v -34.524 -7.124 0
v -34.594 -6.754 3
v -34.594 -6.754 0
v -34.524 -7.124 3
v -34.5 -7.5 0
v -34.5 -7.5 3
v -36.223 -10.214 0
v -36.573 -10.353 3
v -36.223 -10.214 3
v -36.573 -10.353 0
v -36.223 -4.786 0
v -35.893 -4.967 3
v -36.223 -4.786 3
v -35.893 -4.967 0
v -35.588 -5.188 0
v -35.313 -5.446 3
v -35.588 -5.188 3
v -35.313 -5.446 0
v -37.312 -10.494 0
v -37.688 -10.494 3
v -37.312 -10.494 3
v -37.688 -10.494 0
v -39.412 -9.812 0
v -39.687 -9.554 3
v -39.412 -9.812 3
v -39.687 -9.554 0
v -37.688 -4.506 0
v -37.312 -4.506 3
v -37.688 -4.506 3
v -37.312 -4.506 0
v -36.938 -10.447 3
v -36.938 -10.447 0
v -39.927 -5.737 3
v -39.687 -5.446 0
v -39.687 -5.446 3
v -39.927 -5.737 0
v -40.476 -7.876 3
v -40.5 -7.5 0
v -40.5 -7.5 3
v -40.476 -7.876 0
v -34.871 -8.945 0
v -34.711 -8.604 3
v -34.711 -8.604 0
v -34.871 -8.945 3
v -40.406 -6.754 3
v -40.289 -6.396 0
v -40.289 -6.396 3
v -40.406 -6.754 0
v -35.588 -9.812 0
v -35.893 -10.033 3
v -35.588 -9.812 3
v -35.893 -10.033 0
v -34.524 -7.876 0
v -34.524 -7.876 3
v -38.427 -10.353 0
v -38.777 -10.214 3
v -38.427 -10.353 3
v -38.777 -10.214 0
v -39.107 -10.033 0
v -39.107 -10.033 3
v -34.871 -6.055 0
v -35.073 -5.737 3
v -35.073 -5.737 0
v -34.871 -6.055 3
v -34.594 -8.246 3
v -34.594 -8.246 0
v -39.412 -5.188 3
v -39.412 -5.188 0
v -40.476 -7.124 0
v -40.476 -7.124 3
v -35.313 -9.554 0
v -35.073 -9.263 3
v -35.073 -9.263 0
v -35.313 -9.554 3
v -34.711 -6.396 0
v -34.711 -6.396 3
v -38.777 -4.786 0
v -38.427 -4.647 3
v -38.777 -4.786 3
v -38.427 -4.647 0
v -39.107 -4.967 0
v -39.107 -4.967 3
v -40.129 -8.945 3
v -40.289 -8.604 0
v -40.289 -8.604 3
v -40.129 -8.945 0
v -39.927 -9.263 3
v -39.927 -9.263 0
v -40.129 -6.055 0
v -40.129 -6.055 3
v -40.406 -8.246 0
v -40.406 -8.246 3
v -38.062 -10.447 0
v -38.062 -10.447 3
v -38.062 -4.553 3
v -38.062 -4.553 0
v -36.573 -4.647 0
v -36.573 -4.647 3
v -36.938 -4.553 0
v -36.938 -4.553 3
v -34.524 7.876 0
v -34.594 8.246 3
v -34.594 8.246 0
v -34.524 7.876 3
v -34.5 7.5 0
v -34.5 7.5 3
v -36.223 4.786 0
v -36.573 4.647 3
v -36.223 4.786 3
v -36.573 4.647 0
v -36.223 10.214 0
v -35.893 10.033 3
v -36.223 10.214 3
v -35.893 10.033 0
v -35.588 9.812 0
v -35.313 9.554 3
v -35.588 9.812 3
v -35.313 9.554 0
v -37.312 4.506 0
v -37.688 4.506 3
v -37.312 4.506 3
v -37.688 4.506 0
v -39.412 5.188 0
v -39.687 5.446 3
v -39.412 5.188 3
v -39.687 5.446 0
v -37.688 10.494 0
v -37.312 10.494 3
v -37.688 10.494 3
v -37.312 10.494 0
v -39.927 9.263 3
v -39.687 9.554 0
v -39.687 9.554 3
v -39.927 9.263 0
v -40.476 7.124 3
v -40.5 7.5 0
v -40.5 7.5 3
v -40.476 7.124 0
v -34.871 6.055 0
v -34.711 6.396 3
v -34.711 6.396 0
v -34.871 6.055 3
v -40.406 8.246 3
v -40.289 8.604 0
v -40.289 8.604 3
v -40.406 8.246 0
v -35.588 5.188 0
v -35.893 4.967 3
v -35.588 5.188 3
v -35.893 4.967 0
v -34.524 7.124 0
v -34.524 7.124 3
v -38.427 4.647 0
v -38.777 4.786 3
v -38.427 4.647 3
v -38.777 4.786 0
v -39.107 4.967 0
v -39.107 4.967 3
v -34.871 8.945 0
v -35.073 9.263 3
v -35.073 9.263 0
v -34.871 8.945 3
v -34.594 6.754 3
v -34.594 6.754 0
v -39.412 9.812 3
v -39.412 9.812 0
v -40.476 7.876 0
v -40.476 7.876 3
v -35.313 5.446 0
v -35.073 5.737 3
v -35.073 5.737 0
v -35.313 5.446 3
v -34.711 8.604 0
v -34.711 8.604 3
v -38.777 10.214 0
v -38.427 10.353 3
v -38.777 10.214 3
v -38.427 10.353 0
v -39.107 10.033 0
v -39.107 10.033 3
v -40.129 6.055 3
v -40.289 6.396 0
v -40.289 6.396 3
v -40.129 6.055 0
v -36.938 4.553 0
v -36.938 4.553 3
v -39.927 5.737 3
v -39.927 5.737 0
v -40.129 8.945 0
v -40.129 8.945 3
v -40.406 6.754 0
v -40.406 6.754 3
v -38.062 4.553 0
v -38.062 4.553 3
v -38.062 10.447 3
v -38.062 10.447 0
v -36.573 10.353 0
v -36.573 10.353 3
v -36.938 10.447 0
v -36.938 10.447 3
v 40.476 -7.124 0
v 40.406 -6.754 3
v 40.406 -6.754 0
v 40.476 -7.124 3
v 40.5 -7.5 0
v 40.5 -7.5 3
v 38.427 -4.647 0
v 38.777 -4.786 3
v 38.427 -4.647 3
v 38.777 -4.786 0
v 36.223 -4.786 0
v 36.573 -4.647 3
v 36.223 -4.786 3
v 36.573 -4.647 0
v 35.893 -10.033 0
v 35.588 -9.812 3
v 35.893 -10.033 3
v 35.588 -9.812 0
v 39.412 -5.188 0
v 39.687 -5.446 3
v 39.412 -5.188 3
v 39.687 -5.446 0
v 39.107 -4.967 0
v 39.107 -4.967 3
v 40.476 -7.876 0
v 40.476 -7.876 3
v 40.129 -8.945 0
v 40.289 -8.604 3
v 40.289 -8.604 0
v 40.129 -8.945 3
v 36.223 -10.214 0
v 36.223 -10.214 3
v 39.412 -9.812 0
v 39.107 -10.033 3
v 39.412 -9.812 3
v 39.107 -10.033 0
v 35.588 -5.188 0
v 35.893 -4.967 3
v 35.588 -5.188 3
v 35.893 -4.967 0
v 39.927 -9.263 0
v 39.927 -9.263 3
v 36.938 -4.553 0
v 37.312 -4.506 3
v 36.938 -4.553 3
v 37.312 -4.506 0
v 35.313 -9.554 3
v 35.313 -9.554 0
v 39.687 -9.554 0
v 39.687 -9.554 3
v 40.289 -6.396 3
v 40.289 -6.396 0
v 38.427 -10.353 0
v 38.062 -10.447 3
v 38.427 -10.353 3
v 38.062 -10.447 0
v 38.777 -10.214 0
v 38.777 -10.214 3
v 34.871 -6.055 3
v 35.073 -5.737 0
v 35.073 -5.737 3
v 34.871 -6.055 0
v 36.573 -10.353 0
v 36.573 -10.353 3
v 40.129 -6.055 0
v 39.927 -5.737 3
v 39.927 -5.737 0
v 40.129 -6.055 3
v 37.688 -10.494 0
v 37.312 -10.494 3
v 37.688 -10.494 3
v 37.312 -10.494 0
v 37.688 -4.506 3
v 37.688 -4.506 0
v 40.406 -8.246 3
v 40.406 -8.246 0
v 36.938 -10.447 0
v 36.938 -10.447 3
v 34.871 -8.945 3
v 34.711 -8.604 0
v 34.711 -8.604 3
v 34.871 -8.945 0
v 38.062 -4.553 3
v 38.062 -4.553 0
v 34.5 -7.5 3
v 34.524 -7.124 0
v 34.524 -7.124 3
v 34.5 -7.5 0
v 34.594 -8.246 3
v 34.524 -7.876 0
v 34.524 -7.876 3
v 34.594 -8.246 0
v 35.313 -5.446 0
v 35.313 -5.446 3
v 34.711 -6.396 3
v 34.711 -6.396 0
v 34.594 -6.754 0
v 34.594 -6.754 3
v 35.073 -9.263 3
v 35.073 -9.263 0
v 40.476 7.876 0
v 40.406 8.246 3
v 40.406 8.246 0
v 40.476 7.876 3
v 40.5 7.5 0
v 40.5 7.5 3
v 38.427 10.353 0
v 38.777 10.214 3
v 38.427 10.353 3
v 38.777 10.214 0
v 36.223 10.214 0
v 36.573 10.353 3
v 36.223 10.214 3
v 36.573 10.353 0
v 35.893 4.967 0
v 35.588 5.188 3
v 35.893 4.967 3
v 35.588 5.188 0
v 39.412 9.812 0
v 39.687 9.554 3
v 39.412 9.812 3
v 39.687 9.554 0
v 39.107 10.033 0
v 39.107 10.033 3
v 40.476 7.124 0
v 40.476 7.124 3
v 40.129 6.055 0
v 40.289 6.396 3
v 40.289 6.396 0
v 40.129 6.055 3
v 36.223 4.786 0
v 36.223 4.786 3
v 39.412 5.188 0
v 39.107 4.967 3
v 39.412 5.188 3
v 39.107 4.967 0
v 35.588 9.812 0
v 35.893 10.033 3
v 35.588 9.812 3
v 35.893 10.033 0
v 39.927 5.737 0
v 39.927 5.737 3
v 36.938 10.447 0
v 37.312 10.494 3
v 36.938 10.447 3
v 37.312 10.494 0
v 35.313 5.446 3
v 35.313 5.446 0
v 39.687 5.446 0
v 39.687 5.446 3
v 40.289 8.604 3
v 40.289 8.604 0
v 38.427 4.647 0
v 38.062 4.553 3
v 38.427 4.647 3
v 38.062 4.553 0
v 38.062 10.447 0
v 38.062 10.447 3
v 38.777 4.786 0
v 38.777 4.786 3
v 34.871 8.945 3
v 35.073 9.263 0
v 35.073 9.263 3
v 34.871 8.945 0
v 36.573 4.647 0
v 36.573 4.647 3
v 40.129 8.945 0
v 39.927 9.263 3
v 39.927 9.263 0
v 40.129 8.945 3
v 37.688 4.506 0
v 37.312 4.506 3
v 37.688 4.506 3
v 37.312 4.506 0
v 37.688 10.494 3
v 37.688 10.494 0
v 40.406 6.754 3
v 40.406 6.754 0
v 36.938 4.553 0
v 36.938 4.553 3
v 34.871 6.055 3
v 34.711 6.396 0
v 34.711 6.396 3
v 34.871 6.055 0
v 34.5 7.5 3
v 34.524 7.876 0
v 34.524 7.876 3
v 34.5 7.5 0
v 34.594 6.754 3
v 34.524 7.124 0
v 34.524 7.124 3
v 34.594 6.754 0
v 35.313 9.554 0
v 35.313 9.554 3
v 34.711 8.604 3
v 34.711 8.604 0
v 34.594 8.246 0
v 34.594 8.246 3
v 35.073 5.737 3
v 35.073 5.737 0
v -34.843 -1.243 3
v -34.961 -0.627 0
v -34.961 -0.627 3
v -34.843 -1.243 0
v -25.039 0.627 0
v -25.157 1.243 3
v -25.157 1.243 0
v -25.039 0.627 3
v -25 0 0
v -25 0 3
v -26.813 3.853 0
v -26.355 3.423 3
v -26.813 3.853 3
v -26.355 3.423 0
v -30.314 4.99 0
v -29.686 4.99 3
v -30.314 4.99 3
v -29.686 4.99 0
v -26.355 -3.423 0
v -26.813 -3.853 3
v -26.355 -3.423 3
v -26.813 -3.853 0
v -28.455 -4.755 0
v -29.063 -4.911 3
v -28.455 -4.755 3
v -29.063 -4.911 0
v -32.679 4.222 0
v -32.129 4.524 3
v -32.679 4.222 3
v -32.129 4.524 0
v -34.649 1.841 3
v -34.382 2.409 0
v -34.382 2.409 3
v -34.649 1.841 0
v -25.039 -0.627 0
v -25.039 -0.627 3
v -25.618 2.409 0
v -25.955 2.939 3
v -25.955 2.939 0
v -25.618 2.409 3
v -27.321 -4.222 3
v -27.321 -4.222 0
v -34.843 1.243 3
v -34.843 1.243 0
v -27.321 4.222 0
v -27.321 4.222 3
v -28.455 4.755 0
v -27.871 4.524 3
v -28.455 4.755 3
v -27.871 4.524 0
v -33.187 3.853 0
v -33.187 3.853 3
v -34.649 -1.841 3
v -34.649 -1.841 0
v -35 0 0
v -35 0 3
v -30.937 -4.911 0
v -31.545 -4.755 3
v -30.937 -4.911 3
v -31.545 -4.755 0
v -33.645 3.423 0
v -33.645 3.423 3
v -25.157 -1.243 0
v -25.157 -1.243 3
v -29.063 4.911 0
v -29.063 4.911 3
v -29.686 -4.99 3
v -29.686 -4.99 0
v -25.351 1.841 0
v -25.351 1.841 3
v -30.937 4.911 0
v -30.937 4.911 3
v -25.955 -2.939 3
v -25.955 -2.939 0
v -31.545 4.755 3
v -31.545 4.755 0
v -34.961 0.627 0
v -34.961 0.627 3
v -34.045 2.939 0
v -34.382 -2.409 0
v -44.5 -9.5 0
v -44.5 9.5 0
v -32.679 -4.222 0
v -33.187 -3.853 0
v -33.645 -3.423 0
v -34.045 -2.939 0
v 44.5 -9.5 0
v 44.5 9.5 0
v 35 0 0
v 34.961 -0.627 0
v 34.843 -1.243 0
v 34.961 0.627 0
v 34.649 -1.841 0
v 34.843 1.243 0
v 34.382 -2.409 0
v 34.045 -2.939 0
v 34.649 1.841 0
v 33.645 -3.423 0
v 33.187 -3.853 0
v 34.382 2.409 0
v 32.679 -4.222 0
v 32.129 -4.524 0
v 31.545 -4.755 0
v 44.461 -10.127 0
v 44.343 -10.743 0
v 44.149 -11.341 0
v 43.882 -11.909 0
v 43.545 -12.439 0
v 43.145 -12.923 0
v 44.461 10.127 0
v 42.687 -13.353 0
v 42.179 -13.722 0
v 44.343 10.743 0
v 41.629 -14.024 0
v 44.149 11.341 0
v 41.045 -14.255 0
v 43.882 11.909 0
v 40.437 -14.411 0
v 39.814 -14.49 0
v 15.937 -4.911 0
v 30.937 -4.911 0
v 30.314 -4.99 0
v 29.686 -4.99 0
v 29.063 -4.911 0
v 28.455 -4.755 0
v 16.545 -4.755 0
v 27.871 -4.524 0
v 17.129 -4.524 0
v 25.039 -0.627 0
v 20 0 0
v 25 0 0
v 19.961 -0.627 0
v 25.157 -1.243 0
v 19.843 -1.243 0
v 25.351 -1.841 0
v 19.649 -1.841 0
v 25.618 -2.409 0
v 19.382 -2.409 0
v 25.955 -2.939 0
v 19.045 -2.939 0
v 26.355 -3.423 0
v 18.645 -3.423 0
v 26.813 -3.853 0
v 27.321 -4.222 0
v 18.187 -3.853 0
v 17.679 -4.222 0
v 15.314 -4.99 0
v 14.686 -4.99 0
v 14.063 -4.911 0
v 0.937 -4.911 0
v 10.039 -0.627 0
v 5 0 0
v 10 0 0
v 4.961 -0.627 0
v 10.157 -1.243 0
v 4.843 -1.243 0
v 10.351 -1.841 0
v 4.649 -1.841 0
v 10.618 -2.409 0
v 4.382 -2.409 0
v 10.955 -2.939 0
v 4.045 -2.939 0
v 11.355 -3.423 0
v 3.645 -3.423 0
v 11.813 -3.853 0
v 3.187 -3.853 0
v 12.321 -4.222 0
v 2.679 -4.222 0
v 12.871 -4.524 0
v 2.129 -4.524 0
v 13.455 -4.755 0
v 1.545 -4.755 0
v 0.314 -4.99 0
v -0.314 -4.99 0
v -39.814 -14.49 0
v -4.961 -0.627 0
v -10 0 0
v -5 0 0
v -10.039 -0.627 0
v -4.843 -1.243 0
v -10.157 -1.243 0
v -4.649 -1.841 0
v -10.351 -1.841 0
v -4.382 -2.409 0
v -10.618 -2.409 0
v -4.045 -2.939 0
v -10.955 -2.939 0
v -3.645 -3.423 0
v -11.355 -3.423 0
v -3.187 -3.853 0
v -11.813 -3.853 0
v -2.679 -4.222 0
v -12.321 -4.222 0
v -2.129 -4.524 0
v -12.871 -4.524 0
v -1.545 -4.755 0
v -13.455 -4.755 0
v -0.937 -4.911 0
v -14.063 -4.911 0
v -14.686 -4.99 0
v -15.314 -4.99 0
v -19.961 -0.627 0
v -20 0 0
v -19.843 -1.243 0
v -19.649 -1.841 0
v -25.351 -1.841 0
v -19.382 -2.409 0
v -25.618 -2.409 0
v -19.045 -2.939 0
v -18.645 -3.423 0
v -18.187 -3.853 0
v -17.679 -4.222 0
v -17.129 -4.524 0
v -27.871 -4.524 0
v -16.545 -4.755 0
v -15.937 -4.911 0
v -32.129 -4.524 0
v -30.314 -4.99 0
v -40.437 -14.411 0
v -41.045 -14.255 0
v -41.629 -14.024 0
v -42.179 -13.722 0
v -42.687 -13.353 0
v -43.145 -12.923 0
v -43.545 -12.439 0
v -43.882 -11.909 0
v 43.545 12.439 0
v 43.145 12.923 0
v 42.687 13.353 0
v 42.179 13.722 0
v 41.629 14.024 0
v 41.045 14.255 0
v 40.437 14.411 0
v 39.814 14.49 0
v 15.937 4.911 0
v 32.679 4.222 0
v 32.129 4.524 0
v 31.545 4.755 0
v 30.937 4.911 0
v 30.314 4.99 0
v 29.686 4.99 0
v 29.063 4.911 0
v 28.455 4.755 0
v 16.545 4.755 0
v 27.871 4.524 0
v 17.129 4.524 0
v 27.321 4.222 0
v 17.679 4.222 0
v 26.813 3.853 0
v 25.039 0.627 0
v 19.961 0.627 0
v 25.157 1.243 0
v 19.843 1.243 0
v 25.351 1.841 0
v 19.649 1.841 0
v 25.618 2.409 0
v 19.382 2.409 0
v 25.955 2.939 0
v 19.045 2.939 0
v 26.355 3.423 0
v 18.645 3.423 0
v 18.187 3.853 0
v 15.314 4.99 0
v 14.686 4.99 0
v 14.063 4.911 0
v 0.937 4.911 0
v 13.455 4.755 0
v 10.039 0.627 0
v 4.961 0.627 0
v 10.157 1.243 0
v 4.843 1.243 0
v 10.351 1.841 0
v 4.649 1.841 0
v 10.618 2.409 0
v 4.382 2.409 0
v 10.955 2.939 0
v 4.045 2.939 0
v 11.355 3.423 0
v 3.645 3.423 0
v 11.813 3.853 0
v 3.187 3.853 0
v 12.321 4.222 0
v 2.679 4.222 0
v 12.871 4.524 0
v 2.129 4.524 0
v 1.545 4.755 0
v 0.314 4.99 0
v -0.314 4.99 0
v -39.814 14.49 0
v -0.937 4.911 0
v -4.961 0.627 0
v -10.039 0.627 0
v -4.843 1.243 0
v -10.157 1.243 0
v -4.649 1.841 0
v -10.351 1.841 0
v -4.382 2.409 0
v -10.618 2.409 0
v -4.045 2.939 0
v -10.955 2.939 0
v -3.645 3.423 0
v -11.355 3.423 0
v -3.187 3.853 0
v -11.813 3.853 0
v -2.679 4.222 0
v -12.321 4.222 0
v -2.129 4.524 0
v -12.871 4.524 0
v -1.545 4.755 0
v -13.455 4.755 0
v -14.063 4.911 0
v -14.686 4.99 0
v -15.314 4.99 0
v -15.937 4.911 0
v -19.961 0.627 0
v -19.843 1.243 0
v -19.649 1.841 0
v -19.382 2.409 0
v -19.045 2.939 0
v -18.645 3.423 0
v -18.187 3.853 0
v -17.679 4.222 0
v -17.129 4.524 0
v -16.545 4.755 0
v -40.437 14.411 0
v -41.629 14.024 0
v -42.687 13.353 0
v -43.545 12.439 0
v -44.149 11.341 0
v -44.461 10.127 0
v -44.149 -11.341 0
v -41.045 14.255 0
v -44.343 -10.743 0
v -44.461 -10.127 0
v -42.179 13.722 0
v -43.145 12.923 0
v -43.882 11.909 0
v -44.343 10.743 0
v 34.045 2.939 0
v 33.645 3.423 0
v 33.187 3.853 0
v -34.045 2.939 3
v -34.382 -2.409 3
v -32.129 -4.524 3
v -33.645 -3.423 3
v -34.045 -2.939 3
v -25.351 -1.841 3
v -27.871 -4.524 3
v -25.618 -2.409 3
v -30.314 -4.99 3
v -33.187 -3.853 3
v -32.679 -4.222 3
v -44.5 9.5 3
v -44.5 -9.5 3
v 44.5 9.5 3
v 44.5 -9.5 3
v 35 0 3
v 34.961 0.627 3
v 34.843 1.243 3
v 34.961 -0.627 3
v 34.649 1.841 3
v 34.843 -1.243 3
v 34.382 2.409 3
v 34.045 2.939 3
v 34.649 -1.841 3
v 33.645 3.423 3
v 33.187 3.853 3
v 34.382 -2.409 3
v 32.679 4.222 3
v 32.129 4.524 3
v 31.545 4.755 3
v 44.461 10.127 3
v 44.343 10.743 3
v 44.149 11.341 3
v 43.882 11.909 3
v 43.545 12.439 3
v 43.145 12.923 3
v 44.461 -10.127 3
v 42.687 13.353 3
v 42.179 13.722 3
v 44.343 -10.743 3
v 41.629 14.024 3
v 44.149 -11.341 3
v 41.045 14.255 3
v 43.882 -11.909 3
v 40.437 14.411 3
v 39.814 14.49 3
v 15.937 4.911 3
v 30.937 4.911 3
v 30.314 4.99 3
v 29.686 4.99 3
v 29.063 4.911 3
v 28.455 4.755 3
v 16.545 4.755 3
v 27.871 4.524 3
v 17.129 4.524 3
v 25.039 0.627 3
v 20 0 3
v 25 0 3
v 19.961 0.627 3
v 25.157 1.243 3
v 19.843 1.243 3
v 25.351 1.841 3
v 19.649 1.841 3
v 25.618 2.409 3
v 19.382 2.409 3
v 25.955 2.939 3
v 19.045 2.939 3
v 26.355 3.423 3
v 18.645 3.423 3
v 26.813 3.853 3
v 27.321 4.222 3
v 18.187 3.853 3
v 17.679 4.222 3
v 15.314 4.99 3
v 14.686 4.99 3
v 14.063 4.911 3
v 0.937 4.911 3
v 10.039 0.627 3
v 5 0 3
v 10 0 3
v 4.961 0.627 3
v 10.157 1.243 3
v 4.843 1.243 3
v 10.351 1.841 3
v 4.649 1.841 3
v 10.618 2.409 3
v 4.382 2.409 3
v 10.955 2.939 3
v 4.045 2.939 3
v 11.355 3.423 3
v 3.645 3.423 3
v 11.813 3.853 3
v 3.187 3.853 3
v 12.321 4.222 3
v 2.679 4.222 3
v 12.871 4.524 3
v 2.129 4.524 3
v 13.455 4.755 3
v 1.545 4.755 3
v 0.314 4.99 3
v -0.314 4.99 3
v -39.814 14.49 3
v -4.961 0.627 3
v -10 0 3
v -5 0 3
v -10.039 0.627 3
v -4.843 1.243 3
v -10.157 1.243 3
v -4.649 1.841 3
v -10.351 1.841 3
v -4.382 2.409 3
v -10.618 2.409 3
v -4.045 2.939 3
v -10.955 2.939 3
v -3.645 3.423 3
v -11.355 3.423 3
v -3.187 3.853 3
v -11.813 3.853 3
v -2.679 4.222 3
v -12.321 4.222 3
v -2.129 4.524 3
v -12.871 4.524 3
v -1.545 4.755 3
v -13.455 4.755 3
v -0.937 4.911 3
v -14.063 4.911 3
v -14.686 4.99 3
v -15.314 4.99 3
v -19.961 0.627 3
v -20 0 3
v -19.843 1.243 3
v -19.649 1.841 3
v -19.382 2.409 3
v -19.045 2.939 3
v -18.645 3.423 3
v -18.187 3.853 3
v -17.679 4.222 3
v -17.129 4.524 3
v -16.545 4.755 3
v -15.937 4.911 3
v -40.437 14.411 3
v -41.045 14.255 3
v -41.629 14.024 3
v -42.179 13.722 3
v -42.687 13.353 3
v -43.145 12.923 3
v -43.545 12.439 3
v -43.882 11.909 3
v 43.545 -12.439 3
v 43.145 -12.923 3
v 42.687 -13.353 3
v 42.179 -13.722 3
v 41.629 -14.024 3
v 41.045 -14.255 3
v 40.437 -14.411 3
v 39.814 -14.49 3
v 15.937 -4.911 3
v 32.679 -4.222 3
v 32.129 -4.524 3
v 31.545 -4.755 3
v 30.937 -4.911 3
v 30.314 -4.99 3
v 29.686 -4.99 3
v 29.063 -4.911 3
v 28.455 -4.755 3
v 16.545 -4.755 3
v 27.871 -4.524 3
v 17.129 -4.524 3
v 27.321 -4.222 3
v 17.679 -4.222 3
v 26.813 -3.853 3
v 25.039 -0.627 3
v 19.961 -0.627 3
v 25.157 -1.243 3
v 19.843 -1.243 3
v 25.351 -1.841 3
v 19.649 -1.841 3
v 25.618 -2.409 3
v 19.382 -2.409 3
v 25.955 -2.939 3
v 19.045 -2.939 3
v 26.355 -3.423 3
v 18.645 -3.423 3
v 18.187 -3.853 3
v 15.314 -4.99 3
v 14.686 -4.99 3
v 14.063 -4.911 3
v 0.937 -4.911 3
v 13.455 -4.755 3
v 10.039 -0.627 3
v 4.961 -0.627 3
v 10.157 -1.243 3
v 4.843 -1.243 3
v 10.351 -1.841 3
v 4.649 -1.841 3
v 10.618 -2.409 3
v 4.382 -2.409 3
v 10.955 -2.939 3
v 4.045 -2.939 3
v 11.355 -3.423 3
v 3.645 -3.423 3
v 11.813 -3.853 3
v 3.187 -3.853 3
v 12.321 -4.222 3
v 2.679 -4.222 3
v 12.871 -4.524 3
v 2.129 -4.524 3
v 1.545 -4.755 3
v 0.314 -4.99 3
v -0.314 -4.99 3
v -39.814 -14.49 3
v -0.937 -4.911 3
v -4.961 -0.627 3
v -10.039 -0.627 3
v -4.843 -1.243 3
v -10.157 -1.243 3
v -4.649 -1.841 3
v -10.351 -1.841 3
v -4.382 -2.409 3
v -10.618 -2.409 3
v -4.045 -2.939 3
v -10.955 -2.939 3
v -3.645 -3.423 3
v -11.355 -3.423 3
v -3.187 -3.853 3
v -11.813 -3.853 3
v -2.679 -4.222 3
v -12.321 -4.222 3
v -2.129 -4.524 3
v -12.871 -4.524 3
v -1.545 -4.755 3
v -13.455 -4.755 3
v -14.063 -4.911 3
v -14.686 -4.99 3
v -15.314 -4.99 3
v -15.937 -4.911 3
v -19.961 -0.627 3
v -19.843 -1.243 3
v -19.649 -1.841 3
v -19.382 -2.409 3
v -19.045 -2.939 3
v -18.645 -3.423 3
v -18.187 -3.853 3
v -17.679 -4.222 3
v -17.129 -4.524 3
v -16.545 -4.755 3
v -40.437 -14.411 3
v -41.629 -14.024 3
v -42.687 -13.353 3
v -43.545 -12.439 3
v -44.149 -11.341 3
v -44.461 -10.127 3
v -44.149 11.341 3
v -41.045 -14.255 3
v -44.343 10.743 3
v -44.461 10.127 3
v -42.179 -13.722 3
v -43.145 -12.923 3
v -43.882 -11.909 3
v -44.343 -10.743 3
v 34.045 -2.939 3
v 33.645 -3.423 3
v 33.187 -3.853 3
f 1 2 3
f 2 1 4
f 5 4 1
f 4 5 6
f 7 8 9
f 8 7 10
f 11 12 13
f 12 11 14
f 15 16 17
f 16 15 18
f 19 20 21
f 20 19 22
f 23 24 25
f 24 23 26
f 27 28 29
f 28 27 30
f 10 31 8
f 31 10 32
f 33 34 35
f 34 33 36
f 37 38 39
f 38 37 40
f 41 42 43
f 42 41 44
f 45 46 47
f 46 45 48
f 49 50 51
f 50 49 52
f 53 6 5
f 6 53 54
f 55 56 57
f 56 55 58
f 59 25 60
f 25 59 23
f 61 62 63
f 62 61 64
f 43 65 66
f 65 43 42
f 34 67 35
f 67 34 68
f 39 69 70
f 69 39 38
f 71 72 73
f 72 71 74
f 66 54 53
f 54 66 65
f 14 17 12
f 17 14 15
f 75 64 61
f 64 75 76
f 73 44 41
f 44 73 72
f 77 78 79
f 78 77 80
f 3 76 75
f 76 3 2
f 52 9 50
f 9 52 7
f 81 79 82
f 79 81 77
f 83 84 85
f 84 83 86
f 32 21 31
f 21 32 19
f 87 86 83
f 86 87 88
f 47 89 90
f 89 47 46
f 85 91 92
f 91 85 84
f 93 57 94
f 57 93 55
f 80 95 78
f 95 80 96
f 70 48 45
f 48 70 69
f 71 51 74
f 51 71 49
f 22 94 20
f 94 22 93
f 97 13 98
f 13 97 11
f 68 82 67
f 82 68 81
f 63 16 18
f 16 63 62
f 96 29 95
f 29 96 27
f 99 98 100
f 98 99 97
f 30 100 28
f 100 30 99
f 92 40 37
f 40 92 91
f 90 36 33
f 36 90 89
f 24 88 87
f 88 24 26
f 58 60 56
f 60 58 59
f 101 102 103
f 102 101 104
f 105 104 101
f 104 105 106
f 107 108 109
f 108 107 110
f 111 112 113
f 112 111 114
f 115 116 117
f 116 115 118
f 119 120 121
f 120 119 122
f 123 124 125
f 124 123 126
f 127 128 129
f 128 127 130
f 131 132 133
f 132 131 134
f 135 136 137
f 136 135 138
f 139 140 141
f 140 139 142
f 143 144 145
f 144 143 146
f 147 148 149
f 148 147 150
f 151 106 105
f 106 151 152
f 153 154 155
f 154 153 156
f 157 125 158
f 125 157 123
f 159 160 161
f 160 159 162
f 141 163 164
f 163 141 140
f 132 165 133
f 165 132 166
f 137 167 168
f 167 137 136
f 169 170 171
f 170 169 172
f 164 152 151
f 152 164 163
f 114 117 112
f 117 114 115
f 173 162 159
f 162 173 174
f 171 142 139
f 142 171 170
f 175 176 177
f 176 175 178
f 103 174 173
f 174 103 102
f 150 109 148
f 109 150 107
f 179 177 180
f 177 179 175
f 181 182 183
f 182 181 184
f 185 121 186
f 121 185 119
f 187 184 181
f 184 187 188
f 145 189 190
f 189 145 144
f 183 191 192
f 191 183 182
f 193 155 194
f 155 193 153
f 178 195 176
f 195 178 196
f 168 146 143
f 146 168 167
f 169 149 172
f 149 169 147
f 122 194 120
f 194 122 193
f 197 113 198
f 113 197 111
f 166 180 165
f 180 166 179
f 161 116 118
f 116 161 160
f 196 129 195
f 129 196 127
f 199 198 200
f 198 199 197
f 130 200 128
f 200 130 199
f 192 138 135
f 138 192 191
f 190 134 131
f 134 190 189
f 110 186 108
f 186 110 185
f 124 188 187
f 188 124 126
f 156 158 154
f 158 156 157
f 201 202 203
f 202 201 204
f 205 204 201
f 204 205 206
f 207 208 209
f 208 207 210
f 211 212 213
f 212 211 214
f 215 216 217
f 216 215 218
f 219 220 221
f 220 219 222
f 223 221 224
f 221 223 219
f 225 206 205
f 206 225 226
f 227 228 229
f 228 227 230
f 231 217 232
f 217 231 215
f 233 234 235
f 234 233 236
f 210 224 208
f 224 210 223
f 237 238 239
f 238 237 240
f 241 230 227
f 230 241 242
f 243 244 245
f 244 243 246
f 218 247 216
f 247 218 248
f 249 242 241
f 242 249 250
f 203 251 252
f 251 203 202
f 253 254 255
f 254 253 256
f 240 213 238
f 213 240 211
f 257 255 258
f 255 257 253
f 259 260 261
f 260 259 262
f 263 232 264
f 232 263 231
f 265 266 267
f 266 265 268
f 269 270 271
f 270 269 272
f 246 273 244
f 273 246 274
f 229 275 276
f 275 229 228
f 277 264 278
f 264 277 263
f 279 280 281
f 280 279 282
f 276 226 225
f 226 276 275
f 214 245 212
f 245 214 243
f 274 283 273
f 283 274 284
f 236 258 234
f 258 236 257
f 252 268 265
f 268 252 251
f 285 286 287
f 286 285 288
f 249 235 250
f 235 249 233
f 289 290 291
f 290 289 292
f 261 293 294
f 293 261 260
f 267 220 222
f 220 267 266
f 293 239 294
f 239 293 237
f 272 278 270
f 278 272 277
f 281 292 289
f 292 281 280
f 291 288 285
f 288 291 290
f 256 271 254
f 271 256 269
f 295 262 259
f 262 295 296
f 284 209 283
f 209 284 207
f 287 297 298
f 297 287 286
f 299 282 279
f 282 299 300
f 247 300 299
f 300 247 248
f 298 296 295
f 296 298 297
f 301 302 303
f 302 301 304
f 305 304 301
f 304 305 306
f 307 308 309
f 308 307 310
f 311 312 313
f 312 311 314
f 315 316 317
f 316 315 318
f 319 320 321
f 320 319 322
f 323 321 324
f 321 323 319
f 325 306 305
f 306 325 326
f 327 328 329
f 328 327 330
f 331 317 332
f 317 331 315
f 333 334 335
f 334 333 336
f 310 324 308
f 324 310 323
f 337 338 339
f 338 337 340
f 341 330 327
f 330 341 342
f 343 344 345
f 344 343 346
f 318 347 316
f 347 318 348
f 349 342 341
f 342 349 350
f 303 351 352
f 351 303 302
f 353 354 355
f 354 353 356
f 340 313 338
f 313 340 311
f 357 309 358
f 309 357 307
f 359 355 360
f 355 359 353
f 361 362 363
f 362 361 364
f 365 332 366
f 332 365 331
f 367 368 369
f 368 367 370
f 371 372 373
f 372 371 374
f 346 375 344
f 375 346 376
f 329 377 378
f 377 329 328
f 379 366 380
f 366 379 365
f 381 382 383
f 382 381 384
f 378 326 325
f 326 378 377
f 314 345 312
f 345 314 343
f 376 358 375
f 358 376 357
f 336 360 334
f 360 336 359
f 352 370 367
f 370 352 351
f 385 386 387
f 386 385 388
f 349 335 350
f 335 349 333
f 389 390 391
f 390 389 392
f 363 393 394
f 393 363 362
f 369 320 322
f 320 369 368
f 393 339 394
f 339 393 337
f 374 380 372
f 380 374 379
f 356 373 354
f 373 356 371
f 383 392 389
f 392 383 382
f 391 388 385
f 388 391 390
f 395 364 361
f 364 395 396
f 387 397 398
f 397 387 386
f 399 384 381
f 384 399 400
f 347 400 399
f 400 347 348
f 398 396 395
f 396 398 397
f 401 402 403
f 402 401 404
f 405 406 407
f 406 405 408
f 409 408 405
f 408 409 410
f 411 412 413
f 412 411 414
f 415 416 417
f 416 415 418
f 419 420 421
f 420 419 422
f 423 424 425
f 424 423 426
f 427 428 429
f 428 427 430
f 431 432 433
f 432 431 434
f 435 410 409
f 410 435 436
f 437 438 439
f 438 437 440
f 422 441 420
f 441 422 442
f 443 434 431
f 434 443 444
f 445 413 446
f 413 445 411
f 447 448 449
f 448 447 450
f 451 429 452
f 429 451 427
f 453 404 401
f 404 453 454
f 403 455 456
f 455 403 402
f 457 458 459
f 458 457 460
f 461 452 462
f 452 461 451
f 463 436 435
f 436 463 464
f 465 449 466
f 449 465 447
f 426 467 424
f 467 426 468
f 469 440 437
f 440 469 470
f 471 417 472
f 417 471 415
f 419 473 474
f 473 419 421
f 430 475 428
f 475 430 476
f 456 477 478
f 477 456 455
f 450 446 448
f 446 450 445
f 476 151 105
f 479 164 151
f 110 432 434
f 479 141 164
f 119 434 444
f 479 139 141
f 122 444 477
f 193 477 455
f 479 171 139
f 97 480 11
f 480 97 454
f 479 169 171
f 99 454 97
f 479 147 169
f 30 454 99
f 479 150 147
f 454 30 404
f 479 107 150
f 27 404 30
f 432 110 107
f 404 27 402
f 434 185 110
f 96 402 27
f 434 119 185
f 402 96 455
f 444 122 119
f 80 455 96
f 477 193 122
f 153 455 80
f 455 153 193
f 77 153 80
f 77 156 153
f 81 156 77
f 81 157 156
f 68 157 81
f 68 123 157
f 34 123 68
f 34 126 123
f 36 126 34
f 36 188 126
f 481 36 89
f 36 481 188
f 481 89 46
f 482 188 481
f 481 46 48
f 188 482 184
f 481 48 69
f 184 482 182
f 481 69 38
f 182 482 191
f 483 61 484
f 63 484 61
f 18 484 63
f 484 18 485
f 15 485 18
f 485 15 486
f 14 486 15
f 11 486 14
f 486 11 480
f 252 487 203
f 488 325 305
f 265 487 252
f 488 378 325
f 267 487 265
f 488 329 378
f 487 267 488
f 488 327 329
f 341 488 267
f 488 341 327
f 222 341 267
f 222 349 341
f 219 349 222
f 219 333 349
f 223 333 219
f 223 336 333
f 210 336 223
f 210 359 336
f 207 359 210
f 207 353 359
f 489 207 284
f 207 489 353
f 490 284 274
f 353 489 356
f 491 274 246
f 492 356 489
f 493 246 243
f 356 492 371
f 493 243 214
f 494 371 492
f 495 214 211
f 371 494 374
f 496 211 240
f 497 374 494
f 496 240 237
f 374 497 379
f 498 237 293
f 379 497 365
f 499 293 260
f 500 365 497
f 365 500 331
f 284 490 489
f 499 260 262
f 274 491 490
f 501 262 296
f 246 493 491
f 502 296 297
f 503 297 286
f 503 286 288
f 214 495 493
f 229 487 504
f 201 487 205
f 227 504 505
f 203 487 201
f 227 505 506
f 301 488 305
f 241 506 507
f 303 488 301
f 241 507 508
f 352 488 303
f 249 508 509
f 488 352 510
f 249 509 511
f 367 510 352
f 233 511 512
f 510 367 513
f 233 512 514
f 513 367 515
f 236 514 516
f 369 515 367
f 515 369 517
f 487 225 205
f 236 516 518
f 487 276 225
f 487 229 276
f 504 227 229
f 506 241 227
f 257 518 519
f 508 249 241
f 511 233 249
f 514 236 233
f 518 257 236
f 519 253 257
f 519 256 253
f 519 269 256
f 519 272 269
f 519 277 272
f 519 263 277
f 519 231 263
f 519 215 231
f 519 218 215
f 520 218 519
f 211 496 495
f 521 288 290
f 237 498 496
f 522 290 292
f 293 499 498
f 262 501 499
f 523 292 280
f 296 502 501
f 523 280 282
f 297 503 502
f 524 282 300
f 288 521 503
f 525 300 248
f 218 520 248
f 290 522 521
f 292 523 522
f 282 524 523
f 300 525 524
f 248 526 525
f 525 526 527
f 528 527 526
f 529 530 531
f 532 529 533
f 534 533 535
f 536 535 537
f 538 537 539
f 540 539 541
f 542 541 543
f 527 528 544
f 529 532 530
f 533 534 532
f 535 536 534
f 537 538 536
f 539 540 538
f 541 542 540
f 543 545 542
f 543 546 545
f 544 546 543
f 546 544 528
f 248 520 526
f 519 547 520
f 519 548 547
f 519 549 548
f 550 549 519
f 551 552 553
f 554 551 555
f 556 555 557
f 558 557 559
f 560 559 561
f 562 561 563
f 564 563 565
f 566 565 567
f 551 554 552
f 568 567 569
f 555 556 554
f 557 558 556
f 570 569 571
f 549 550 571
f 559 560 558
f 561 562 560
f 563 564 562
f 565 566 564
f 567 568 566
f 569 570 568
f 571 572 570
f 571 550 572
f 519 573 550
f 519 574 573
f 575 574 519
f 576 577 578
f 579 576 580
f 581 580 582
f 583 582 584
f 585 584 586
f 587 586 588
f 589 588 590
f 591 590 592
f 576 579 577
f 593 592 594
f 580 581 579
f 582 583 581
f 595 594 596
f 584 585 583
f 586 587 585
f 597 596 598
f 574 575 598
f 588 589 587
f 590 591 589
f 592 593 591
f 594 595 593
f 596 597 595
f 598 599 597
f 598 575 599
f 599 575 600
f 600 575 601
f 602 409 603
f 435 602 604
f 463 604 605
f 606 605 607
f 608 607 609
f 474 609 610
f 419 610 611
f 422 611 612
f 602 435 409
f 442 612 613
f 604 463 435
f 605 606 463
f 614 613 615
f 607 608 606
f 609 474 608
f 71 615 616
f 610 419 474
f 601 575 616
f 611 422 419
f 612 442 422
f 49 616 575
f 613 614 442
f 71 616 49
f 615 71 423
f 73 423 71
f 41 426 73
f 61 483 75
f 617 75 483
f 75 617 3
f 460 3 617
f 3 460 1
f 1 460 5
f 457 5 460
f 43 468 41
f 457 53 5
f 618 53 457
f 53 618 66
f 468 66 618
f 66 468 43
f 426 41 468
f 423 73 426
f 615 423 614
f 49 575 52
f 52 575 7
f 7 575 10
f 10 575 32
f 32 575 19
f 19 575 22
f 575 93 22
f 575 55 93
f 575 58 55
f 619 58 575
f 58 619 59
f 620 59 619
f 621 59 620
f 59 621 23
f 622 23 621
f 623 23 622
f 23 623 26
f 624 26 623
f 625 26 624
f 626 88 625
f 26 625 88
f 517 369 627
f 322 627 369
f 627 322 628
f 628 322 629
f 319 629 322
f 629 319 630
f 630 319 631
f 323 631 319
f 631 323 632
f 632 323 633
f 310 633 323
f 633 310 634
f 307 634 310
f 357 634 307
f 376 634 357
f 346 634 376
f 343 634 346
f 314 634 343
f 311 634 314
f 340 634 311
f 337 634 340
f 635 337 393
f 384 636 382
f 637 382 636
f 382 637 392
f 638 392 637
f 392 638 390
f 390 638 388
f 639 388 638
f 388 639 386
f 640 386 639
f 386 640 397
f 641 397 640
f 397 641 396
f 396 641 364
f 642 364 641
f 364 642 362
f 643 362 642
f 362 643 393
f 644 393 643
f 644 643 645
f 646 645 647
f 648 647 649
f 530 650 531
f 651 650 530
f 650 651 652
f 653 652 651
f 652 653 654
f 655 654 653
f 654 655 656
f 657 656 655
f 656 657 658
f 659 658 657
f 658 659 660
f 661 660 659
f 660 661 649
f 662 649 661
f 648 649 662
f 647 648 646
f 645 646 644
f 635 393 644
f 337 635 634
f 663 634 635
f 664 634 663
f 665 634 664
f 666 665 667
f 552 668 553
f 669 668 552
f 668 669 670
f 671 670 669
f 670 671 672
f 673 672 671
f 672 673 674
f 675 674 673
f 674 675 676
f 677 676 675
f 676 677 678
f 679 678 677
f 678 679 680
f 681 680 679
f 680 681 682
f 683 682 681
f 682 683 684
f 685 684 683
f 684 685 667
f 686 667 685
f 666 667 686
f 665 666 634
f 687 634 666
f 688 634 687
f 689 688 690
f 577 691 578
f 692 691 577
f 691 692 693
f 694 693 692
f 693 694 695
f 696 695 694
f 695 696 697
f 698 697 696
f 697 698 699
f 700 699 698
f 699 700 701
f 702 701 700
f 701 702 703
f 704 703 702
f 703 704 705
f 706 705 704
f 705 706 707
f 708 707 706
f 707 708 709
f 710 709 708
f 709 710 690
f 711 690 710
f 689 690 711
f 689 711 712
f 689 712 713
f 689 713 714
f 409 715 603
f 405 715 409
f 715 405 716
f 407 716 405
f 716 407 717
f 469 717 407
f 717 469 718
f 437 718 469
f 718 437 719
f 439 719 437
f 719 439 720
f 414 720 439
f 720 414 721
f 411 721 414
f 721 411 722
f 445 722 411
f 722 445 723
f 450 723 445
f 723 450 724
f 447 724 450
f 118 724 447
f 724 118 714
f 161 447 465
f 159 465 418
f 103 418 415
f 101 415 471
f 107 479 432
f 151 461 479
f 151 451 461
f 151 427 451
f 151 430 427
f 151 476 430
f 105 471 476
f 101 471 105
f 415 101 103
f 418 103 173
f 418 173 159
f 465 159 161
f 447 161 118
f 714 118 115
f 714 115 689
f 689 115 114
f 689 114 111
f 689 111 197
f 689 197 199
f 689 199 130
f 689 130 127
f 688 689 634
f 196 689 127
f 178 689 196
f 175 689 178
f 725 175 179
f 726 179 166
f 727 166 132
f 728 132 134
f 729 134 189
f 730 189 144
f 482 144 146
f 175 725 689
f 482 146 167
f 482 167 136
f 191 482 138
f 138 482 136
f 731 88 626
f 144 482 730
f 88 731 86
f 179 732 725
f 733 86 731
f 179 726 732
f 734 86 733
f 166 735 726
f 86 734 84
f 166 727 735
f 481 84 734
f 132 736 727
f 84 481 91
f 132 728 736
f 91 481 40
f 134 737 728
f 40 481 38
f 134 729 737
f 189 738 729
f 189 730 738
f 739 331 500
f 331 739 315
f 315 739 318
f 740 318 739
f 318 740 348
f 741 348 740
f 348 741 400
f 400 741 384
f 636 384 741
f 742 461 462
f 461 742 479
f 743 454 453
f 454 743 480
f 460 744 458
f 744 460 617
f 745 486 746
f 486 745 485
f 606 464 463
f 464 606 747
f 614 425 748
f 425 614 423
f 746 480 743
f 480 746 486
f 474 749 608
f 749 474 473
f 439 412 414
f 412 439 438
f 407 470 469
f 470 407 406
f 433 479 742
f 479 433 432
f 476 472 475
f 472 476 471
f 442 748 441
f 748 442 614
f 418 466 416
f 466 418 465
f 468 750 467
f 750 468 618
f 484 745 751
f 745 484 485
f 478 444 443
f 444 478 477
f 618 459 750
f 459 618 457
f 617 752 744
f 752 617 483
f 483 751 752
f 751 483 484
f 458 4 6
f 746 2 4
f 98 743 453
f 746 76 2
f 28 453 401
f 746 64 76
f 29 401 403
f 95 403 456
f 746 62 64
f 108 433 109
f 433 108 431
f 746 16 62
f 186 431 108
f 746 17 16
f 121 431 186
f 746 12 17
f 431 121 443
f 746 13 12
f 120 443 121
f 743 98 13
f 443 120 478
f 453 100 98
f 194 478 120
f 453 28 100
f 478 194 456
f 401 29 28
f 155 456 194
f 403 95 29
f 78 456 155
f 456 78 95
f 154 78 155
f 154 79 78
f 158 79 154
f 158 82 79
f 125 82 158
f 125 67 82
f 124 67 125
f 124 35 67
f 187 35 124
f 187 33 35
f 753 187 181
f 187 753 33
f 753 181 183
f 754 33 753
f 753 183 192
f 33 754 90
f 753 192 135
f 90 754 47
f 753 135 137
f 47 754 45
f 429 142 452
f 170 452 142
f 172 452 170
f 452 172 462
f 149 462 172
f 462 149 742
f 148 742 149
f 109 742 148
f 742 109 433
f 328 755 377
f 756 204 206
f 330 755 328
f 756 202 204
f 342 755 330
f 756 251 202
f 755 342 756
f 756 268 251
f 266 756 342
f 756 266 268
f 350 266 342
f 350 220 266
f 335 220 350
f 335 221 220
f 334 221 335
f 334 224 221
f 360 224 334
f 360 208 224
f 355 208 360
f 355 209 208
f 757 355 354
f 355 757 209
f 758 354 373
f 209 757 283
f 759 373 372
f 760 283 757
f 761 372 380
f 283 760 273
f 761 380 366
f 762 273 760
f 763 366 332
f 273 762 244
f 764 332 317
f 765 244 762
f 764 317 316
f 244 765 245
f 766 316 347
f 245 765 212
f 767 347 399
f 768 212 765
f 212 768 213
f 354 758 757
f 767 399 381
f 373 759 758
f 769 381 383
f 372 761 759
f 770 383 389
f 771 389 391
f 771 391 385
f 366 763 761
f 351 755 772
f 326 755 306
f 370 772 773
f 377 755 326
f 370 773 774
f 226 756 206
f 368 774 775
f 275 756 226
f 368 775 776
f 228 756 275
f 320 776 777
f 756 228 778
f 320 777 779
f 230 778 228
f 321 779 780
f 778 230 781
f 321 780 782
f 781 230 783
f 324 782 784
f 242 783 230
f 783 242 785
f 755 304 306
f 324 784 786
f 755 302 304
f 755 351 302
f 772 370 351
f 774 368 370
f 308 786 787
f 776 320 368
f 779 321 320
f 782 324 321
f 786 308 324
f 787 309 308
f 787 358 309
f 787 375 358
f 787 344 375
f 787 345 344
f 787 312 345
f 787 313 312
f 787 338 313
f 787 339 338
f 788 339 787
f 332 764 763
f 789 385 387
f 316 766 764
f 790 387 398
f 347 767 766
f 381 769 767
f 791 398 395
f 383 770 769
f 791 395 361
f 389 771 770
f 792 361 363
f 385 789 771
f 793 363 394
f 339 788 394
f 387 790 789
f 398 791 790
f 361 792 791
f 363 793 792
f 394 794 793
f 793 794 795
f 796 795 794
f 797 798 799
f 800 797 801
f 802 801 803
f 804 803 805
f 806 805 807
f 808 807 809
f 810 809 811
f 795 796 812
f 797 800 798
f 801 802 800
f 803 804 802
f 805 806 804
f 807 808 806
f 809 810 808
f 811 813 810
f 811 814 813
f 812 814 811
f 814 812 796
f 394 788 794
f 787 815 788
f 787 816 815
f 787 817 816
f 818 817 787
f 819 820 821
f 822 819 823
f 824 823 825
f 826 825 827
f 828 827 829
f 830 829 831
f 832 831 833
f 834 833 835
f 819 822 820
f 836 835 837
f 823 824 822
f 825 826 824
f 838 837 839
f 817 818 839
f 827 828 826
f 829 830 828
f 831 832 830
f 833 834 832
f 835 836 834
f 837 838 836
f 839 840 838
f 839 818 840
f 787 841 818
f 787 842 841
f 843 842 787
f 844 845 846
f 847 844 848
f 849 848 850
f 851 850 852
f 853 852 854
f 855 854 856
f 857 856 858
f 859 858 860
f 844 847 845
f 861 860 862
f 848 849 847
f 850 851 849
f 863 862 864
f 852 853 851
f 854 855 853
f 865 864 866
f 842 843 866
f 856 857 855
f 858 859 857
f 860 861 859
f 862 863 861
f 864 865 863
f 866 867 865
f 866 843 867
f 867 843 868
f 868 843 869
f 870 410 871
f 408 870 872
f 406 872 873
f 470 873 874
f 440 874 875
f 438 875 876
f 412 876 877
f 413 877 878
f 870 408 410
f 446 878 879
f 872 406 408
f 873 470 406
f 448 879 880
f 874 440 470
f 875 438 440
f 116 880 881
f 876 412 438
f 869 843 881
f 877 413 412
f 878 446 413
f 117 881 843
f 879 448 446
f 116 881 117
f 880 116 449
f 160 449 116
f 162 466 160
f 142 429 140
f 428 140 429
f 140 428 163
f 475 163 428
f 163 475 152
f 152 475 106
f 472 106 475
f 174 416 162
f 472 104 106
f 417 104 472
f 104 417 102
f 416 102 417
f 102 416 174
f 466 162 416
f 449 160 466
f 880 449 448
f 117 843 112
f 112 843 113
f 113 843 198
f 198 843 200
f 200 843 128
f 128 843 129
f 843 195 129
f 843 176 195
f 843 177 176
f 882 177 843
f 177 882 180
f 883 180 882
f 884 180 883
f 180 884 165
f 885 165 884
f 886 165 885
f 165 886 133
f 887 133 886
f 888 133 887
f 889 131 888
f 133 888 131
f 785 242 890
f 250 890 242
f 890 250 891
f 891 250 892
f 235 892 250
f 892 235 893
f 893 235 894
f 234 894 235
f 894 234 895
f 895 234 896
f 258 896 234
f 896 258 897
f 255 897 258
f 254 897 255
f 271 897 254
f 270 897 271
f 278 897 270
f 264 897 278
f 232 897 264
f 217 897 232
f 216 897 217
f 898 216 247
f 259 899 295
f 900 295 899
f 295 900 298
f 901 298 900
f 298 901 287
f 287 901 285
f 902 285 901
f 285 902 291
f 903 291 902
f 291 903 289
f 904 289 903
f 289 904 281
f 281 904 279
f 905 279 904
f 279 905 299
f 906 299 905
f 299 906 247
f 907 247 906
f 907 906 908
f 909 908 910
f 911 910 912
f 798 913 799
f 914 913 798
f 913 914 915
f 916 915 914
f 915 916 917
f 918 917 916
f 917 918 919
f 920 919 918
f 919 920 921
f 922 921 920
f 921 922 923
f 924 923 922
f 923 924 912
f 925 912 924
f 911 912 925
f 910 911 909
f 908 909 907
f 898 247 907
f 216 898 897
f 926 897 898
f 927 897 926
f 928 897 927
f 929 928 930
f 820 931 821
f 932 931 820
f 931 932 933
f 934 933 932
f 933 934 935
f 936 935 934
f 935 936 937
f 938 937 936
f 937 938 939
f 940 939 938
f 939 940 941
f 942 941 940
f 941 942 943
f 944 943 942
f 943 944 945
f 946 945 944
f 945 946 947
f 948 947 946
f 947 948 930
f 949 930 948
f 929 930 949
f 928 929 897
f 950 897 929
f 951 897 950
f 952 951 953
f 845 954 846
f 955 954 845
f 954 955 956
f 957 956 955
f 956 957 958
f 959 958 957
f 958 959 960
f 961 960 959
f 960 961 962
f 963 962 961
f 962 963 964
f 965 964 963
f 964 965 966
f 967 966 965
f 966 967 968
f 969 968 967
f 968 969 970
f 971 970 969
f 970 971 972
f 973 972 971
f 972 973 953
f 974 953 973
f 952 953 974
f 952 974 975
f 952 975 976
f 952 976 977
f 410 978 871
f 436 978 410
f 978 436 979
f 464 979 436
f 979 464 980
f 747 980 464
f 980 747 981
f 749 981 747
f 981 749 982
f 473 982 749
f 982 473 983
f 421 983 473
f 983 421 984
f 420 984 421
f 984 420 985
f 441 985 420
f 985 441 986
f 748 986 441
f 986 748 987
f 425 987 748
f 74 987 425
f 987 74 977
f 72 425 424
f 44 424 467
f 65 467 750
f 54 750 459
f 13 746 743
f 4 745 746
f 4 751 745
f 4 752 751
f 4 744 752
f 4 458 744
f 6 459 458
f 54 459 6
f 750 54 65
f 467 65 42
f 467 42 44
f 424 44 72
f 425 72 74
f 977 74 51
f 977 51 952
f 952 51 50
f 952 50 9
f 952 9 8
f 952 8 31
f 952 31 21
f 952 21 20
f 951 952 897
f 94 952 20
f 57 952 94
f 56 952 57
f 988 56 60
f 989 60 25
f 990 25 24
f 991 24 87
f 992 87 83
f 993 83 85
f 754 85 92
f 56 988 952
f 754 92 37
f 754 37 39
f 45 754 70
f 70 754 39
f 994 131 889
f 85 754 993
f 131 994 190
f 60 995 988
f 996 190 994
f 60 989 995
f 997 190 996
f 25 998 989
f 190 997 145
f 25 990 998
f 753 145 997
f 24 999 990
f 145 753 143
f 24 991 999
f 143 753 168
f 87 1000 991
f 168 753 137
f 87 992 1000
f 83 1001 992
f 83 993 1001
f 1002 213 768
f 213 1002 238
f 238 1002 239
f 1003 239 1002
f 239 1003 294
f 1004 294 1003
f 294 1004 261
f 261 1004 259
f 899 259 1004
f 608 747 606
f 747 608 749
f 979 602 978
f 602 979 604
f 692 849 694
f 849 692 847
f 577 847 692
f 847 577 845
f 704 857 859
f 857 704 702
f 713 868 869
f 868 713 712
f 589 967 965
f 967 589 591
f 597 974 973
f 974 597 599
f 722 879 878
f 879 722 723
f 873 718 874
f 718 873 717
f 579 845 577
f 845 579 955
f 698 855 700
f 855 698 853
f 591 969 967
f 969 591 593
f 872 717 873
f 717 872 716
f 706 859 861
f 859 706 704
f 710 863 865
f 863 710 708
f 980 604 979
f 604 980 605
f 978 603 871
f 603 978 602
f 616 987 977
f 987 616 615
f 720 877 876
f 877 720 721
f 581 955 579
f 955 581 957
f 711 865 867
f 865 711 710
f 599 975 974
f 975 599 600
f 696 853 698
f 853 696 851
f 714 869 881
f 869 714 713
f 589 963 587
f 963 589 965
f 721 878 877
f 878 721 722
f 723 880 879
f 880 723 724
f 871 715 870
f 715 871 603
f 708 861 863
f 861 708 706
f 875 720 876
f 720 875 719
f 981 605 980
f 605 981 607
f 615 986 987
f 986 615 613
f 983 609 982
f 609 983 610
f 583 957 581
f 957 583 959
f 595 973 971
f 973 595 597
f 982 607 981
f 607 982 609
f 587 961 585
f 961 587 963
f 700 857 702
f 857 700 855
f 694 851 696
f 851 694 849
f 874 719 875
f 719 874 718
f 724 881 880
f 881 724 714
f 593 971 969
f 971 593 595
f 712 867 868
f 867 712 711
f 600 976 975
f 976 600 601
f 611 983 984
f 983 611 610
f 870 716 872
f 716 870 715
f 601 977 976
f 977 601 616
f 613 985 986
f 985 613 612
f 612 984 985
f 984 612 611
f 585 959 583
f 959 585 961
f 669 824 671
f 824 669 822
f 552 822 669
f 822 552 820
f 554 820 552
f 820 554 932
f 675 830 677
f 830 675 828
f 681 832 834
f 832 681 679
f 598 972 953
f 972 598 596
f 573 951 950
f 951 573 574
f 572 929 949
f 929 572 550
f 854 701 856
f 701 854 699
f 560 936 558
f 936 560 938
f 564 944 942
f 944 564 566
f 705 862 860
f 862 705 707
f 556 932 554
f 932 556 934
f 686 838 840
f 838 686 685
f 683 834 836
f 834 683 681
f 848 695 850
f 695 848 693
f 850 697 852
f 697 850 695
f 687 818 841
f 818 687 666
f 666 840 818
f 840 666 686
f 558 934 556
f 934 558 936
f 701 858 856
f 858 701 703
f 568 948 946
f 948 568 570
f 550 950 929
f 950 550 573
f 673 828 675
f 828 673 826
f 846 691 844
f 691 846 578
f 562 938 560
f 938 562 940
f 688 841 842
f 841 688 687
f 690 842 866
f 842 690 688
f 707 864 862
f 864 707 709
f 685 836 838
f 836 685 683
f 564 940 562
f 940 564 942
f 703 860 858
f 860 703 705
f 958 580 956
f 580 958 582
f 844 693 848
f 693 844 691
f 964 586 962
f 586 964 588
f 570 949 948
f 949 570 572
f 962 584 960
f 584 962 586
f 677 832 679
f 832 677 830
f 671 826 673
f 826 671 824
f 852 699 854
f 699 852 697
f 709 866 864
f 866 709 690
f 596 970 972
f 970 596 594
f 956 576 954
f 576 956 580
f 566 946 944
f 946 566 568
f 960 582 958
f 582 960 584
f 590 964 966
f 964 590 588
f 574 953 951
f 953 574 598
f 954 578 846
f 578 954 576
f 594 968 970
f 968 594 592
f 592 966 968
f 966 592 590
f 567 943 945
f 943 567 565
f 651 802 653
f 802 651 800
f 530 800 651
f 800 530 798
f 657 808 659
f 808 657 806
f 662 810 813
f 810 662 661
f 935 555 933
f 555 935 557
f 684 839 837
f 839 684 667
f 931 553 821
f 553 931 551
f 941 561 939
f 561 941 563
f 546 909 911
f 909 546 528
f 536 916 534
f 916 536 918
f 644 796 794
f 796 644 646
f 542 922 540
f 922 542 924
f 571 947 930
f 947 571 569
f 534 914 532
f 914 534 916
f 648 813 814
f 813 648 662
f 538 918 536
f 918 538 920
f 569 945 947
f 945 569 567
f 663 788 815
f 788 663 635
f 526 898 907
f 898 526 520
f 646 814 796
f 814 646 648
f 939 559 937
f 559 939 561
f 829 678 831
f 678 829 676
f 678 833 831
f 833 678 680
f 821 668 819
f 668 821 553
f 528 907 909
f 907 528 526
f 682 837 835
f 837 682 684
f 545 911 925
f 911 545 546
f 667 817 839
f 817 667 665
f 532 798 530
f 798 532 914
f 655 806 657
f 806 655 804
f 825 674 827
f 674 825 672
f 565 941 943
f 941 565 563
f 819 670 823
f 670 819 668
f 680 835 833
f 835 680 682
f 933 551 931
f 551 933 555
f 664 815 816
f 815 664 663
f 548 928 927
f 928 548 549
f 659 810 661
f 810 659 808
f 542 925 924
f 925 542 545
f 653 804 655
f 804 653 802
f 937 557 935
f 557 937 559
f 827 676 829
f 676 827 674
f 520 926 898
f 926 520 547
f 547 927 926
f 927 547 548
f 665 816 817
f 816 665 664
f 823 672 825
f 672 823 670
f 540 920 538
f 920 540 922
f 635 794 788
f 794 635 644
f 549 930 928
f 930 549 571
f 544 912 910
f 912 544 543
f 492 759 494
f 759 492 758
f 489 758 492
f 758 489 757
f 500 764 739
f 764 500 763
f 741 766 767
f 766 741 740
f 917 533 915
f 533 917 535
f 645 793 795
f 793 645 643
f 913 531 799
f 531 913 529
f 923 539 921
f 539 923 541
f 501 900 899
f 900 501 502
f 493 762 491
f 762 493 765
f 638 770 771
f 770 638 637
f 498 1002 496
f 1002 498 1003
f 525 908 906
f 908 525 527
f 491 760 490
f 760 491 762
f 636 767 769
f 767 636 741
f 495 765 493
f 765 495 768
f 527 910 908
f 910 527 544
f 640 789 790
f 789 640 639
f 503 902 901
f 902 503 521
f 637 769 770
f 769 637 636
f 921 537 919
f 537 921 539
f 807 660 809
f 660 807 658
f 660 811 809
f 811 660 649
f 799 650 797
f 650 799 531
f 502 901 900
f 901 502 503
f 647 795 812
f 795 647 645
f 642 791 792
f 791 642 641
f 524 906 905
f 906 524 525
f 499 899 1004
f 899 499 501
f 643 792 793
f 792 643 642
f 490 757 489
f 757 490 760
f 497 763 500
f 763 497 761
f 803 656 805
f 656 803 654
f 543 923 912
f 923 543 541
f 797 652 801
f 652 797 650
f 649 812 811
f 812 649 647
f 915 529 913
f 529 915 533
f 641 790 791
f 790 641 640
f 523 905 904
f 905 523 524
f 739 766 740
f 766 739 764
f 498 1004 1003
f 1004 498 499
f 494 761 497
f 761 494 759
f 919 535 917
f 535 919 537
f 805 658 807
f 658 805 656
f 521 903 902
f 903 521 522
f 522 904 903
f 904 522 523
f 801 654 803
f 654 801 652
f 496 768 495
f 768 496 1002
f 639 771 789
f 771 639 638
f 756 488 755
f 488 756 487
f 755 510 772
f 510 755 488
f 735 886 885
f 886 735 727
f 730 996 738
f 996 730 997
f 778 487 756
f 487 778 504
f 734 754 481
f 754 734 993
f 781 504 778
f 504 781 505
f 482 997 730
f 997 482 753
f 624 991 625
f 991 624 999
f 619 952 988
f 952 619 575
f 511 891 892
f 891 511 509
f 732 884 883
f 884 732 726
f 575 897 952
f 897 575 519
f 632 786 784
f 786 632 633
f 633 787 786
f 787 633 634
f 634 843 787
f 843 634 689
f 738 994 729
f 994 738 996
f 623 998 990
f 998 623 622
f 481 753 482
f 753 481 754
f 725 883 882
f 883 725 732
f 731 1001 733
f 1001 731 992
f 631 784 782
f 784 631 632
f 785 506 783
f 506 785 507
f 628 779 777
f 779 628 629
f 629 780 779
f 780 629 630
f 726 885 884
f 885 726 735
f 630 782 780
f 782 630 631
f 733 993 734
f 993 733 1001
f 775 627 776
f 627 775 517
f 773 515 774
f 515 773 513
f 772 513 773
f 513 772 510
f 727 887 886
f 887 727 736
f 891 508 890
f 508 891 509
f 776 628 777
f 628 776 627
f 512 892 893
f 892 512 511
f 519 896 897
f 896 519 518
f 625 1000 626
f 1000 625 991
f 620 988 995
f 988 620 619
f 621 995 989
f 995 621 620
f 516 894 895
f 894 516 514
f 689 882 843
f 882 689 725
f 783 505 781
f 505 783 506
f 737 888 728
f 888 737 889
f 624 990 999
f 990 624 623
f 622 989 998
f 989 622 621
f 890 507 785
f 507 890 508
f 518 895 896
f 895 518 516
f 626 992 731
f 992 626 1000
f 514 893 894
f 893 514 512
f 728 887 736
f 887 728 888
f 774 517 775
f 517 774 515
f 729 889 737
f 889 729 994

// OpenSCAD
$fn = 50;


difference() {
	union() {
		hull() {
			translate(v = [-39.5000000000, 9.5000000000, 0]) {
				cylinder(h = 3, r = 5);
			}
			translate(v = [39.5000000000, 9.5000000000, 0]) {
				cylinder(h = 3, r = 5);
			}
			translate(v = [-39.5000000000, -9.5000000000, 0]) {
				cylinder(h = 3, r = 5);
			}
			translate(v = [39.5000000000, -9.5000000000, 0]) {
				cylinder(h = 3, r = 5);
			}
		}
	}
	union() {
		#translate(v = [-37.5000000000, -7.5000000000, -100.0000000000]) {
			cylinder(h = 200, r = 3.0000000000);
		}
		#translate(v = [-37.5000000000, 7.5000000000, -100.0000000000]) {
			cylinder(h = 200, r = 3.0000000000);
		}
		#translate(v = [37.5000000000, -7.5000000000, -100.0000000000]) {
			cylinder(h = 200, r = 3.0000000000);
		}
		#translate(v = [37.5000000000, 7.5000000000, -100.0000000000]) {
			cylinder(h = 200, r = 3.0000000000);
		}
		#translate(v = [-30.0000000000, 0, 0]) {
			cylinder(h = 3, r = 5.0000000000);
		}
		#translate(v = [-15.0000000000, 0, 0]) {
			cylinder(h = 3, r = 5.0000000000);
		}
		#cylinder(h = 3, r = 5.0000000000);
		#translate(v = [15.0000000000, 0, 0]) {
			cylinder(h = 3, r = 5.0000000000);
		}
		#translate(v = [30.0000000000, 0, 0]) {
			cylinder(h = 3, r = 5.0000000000);
		}
	}
}
